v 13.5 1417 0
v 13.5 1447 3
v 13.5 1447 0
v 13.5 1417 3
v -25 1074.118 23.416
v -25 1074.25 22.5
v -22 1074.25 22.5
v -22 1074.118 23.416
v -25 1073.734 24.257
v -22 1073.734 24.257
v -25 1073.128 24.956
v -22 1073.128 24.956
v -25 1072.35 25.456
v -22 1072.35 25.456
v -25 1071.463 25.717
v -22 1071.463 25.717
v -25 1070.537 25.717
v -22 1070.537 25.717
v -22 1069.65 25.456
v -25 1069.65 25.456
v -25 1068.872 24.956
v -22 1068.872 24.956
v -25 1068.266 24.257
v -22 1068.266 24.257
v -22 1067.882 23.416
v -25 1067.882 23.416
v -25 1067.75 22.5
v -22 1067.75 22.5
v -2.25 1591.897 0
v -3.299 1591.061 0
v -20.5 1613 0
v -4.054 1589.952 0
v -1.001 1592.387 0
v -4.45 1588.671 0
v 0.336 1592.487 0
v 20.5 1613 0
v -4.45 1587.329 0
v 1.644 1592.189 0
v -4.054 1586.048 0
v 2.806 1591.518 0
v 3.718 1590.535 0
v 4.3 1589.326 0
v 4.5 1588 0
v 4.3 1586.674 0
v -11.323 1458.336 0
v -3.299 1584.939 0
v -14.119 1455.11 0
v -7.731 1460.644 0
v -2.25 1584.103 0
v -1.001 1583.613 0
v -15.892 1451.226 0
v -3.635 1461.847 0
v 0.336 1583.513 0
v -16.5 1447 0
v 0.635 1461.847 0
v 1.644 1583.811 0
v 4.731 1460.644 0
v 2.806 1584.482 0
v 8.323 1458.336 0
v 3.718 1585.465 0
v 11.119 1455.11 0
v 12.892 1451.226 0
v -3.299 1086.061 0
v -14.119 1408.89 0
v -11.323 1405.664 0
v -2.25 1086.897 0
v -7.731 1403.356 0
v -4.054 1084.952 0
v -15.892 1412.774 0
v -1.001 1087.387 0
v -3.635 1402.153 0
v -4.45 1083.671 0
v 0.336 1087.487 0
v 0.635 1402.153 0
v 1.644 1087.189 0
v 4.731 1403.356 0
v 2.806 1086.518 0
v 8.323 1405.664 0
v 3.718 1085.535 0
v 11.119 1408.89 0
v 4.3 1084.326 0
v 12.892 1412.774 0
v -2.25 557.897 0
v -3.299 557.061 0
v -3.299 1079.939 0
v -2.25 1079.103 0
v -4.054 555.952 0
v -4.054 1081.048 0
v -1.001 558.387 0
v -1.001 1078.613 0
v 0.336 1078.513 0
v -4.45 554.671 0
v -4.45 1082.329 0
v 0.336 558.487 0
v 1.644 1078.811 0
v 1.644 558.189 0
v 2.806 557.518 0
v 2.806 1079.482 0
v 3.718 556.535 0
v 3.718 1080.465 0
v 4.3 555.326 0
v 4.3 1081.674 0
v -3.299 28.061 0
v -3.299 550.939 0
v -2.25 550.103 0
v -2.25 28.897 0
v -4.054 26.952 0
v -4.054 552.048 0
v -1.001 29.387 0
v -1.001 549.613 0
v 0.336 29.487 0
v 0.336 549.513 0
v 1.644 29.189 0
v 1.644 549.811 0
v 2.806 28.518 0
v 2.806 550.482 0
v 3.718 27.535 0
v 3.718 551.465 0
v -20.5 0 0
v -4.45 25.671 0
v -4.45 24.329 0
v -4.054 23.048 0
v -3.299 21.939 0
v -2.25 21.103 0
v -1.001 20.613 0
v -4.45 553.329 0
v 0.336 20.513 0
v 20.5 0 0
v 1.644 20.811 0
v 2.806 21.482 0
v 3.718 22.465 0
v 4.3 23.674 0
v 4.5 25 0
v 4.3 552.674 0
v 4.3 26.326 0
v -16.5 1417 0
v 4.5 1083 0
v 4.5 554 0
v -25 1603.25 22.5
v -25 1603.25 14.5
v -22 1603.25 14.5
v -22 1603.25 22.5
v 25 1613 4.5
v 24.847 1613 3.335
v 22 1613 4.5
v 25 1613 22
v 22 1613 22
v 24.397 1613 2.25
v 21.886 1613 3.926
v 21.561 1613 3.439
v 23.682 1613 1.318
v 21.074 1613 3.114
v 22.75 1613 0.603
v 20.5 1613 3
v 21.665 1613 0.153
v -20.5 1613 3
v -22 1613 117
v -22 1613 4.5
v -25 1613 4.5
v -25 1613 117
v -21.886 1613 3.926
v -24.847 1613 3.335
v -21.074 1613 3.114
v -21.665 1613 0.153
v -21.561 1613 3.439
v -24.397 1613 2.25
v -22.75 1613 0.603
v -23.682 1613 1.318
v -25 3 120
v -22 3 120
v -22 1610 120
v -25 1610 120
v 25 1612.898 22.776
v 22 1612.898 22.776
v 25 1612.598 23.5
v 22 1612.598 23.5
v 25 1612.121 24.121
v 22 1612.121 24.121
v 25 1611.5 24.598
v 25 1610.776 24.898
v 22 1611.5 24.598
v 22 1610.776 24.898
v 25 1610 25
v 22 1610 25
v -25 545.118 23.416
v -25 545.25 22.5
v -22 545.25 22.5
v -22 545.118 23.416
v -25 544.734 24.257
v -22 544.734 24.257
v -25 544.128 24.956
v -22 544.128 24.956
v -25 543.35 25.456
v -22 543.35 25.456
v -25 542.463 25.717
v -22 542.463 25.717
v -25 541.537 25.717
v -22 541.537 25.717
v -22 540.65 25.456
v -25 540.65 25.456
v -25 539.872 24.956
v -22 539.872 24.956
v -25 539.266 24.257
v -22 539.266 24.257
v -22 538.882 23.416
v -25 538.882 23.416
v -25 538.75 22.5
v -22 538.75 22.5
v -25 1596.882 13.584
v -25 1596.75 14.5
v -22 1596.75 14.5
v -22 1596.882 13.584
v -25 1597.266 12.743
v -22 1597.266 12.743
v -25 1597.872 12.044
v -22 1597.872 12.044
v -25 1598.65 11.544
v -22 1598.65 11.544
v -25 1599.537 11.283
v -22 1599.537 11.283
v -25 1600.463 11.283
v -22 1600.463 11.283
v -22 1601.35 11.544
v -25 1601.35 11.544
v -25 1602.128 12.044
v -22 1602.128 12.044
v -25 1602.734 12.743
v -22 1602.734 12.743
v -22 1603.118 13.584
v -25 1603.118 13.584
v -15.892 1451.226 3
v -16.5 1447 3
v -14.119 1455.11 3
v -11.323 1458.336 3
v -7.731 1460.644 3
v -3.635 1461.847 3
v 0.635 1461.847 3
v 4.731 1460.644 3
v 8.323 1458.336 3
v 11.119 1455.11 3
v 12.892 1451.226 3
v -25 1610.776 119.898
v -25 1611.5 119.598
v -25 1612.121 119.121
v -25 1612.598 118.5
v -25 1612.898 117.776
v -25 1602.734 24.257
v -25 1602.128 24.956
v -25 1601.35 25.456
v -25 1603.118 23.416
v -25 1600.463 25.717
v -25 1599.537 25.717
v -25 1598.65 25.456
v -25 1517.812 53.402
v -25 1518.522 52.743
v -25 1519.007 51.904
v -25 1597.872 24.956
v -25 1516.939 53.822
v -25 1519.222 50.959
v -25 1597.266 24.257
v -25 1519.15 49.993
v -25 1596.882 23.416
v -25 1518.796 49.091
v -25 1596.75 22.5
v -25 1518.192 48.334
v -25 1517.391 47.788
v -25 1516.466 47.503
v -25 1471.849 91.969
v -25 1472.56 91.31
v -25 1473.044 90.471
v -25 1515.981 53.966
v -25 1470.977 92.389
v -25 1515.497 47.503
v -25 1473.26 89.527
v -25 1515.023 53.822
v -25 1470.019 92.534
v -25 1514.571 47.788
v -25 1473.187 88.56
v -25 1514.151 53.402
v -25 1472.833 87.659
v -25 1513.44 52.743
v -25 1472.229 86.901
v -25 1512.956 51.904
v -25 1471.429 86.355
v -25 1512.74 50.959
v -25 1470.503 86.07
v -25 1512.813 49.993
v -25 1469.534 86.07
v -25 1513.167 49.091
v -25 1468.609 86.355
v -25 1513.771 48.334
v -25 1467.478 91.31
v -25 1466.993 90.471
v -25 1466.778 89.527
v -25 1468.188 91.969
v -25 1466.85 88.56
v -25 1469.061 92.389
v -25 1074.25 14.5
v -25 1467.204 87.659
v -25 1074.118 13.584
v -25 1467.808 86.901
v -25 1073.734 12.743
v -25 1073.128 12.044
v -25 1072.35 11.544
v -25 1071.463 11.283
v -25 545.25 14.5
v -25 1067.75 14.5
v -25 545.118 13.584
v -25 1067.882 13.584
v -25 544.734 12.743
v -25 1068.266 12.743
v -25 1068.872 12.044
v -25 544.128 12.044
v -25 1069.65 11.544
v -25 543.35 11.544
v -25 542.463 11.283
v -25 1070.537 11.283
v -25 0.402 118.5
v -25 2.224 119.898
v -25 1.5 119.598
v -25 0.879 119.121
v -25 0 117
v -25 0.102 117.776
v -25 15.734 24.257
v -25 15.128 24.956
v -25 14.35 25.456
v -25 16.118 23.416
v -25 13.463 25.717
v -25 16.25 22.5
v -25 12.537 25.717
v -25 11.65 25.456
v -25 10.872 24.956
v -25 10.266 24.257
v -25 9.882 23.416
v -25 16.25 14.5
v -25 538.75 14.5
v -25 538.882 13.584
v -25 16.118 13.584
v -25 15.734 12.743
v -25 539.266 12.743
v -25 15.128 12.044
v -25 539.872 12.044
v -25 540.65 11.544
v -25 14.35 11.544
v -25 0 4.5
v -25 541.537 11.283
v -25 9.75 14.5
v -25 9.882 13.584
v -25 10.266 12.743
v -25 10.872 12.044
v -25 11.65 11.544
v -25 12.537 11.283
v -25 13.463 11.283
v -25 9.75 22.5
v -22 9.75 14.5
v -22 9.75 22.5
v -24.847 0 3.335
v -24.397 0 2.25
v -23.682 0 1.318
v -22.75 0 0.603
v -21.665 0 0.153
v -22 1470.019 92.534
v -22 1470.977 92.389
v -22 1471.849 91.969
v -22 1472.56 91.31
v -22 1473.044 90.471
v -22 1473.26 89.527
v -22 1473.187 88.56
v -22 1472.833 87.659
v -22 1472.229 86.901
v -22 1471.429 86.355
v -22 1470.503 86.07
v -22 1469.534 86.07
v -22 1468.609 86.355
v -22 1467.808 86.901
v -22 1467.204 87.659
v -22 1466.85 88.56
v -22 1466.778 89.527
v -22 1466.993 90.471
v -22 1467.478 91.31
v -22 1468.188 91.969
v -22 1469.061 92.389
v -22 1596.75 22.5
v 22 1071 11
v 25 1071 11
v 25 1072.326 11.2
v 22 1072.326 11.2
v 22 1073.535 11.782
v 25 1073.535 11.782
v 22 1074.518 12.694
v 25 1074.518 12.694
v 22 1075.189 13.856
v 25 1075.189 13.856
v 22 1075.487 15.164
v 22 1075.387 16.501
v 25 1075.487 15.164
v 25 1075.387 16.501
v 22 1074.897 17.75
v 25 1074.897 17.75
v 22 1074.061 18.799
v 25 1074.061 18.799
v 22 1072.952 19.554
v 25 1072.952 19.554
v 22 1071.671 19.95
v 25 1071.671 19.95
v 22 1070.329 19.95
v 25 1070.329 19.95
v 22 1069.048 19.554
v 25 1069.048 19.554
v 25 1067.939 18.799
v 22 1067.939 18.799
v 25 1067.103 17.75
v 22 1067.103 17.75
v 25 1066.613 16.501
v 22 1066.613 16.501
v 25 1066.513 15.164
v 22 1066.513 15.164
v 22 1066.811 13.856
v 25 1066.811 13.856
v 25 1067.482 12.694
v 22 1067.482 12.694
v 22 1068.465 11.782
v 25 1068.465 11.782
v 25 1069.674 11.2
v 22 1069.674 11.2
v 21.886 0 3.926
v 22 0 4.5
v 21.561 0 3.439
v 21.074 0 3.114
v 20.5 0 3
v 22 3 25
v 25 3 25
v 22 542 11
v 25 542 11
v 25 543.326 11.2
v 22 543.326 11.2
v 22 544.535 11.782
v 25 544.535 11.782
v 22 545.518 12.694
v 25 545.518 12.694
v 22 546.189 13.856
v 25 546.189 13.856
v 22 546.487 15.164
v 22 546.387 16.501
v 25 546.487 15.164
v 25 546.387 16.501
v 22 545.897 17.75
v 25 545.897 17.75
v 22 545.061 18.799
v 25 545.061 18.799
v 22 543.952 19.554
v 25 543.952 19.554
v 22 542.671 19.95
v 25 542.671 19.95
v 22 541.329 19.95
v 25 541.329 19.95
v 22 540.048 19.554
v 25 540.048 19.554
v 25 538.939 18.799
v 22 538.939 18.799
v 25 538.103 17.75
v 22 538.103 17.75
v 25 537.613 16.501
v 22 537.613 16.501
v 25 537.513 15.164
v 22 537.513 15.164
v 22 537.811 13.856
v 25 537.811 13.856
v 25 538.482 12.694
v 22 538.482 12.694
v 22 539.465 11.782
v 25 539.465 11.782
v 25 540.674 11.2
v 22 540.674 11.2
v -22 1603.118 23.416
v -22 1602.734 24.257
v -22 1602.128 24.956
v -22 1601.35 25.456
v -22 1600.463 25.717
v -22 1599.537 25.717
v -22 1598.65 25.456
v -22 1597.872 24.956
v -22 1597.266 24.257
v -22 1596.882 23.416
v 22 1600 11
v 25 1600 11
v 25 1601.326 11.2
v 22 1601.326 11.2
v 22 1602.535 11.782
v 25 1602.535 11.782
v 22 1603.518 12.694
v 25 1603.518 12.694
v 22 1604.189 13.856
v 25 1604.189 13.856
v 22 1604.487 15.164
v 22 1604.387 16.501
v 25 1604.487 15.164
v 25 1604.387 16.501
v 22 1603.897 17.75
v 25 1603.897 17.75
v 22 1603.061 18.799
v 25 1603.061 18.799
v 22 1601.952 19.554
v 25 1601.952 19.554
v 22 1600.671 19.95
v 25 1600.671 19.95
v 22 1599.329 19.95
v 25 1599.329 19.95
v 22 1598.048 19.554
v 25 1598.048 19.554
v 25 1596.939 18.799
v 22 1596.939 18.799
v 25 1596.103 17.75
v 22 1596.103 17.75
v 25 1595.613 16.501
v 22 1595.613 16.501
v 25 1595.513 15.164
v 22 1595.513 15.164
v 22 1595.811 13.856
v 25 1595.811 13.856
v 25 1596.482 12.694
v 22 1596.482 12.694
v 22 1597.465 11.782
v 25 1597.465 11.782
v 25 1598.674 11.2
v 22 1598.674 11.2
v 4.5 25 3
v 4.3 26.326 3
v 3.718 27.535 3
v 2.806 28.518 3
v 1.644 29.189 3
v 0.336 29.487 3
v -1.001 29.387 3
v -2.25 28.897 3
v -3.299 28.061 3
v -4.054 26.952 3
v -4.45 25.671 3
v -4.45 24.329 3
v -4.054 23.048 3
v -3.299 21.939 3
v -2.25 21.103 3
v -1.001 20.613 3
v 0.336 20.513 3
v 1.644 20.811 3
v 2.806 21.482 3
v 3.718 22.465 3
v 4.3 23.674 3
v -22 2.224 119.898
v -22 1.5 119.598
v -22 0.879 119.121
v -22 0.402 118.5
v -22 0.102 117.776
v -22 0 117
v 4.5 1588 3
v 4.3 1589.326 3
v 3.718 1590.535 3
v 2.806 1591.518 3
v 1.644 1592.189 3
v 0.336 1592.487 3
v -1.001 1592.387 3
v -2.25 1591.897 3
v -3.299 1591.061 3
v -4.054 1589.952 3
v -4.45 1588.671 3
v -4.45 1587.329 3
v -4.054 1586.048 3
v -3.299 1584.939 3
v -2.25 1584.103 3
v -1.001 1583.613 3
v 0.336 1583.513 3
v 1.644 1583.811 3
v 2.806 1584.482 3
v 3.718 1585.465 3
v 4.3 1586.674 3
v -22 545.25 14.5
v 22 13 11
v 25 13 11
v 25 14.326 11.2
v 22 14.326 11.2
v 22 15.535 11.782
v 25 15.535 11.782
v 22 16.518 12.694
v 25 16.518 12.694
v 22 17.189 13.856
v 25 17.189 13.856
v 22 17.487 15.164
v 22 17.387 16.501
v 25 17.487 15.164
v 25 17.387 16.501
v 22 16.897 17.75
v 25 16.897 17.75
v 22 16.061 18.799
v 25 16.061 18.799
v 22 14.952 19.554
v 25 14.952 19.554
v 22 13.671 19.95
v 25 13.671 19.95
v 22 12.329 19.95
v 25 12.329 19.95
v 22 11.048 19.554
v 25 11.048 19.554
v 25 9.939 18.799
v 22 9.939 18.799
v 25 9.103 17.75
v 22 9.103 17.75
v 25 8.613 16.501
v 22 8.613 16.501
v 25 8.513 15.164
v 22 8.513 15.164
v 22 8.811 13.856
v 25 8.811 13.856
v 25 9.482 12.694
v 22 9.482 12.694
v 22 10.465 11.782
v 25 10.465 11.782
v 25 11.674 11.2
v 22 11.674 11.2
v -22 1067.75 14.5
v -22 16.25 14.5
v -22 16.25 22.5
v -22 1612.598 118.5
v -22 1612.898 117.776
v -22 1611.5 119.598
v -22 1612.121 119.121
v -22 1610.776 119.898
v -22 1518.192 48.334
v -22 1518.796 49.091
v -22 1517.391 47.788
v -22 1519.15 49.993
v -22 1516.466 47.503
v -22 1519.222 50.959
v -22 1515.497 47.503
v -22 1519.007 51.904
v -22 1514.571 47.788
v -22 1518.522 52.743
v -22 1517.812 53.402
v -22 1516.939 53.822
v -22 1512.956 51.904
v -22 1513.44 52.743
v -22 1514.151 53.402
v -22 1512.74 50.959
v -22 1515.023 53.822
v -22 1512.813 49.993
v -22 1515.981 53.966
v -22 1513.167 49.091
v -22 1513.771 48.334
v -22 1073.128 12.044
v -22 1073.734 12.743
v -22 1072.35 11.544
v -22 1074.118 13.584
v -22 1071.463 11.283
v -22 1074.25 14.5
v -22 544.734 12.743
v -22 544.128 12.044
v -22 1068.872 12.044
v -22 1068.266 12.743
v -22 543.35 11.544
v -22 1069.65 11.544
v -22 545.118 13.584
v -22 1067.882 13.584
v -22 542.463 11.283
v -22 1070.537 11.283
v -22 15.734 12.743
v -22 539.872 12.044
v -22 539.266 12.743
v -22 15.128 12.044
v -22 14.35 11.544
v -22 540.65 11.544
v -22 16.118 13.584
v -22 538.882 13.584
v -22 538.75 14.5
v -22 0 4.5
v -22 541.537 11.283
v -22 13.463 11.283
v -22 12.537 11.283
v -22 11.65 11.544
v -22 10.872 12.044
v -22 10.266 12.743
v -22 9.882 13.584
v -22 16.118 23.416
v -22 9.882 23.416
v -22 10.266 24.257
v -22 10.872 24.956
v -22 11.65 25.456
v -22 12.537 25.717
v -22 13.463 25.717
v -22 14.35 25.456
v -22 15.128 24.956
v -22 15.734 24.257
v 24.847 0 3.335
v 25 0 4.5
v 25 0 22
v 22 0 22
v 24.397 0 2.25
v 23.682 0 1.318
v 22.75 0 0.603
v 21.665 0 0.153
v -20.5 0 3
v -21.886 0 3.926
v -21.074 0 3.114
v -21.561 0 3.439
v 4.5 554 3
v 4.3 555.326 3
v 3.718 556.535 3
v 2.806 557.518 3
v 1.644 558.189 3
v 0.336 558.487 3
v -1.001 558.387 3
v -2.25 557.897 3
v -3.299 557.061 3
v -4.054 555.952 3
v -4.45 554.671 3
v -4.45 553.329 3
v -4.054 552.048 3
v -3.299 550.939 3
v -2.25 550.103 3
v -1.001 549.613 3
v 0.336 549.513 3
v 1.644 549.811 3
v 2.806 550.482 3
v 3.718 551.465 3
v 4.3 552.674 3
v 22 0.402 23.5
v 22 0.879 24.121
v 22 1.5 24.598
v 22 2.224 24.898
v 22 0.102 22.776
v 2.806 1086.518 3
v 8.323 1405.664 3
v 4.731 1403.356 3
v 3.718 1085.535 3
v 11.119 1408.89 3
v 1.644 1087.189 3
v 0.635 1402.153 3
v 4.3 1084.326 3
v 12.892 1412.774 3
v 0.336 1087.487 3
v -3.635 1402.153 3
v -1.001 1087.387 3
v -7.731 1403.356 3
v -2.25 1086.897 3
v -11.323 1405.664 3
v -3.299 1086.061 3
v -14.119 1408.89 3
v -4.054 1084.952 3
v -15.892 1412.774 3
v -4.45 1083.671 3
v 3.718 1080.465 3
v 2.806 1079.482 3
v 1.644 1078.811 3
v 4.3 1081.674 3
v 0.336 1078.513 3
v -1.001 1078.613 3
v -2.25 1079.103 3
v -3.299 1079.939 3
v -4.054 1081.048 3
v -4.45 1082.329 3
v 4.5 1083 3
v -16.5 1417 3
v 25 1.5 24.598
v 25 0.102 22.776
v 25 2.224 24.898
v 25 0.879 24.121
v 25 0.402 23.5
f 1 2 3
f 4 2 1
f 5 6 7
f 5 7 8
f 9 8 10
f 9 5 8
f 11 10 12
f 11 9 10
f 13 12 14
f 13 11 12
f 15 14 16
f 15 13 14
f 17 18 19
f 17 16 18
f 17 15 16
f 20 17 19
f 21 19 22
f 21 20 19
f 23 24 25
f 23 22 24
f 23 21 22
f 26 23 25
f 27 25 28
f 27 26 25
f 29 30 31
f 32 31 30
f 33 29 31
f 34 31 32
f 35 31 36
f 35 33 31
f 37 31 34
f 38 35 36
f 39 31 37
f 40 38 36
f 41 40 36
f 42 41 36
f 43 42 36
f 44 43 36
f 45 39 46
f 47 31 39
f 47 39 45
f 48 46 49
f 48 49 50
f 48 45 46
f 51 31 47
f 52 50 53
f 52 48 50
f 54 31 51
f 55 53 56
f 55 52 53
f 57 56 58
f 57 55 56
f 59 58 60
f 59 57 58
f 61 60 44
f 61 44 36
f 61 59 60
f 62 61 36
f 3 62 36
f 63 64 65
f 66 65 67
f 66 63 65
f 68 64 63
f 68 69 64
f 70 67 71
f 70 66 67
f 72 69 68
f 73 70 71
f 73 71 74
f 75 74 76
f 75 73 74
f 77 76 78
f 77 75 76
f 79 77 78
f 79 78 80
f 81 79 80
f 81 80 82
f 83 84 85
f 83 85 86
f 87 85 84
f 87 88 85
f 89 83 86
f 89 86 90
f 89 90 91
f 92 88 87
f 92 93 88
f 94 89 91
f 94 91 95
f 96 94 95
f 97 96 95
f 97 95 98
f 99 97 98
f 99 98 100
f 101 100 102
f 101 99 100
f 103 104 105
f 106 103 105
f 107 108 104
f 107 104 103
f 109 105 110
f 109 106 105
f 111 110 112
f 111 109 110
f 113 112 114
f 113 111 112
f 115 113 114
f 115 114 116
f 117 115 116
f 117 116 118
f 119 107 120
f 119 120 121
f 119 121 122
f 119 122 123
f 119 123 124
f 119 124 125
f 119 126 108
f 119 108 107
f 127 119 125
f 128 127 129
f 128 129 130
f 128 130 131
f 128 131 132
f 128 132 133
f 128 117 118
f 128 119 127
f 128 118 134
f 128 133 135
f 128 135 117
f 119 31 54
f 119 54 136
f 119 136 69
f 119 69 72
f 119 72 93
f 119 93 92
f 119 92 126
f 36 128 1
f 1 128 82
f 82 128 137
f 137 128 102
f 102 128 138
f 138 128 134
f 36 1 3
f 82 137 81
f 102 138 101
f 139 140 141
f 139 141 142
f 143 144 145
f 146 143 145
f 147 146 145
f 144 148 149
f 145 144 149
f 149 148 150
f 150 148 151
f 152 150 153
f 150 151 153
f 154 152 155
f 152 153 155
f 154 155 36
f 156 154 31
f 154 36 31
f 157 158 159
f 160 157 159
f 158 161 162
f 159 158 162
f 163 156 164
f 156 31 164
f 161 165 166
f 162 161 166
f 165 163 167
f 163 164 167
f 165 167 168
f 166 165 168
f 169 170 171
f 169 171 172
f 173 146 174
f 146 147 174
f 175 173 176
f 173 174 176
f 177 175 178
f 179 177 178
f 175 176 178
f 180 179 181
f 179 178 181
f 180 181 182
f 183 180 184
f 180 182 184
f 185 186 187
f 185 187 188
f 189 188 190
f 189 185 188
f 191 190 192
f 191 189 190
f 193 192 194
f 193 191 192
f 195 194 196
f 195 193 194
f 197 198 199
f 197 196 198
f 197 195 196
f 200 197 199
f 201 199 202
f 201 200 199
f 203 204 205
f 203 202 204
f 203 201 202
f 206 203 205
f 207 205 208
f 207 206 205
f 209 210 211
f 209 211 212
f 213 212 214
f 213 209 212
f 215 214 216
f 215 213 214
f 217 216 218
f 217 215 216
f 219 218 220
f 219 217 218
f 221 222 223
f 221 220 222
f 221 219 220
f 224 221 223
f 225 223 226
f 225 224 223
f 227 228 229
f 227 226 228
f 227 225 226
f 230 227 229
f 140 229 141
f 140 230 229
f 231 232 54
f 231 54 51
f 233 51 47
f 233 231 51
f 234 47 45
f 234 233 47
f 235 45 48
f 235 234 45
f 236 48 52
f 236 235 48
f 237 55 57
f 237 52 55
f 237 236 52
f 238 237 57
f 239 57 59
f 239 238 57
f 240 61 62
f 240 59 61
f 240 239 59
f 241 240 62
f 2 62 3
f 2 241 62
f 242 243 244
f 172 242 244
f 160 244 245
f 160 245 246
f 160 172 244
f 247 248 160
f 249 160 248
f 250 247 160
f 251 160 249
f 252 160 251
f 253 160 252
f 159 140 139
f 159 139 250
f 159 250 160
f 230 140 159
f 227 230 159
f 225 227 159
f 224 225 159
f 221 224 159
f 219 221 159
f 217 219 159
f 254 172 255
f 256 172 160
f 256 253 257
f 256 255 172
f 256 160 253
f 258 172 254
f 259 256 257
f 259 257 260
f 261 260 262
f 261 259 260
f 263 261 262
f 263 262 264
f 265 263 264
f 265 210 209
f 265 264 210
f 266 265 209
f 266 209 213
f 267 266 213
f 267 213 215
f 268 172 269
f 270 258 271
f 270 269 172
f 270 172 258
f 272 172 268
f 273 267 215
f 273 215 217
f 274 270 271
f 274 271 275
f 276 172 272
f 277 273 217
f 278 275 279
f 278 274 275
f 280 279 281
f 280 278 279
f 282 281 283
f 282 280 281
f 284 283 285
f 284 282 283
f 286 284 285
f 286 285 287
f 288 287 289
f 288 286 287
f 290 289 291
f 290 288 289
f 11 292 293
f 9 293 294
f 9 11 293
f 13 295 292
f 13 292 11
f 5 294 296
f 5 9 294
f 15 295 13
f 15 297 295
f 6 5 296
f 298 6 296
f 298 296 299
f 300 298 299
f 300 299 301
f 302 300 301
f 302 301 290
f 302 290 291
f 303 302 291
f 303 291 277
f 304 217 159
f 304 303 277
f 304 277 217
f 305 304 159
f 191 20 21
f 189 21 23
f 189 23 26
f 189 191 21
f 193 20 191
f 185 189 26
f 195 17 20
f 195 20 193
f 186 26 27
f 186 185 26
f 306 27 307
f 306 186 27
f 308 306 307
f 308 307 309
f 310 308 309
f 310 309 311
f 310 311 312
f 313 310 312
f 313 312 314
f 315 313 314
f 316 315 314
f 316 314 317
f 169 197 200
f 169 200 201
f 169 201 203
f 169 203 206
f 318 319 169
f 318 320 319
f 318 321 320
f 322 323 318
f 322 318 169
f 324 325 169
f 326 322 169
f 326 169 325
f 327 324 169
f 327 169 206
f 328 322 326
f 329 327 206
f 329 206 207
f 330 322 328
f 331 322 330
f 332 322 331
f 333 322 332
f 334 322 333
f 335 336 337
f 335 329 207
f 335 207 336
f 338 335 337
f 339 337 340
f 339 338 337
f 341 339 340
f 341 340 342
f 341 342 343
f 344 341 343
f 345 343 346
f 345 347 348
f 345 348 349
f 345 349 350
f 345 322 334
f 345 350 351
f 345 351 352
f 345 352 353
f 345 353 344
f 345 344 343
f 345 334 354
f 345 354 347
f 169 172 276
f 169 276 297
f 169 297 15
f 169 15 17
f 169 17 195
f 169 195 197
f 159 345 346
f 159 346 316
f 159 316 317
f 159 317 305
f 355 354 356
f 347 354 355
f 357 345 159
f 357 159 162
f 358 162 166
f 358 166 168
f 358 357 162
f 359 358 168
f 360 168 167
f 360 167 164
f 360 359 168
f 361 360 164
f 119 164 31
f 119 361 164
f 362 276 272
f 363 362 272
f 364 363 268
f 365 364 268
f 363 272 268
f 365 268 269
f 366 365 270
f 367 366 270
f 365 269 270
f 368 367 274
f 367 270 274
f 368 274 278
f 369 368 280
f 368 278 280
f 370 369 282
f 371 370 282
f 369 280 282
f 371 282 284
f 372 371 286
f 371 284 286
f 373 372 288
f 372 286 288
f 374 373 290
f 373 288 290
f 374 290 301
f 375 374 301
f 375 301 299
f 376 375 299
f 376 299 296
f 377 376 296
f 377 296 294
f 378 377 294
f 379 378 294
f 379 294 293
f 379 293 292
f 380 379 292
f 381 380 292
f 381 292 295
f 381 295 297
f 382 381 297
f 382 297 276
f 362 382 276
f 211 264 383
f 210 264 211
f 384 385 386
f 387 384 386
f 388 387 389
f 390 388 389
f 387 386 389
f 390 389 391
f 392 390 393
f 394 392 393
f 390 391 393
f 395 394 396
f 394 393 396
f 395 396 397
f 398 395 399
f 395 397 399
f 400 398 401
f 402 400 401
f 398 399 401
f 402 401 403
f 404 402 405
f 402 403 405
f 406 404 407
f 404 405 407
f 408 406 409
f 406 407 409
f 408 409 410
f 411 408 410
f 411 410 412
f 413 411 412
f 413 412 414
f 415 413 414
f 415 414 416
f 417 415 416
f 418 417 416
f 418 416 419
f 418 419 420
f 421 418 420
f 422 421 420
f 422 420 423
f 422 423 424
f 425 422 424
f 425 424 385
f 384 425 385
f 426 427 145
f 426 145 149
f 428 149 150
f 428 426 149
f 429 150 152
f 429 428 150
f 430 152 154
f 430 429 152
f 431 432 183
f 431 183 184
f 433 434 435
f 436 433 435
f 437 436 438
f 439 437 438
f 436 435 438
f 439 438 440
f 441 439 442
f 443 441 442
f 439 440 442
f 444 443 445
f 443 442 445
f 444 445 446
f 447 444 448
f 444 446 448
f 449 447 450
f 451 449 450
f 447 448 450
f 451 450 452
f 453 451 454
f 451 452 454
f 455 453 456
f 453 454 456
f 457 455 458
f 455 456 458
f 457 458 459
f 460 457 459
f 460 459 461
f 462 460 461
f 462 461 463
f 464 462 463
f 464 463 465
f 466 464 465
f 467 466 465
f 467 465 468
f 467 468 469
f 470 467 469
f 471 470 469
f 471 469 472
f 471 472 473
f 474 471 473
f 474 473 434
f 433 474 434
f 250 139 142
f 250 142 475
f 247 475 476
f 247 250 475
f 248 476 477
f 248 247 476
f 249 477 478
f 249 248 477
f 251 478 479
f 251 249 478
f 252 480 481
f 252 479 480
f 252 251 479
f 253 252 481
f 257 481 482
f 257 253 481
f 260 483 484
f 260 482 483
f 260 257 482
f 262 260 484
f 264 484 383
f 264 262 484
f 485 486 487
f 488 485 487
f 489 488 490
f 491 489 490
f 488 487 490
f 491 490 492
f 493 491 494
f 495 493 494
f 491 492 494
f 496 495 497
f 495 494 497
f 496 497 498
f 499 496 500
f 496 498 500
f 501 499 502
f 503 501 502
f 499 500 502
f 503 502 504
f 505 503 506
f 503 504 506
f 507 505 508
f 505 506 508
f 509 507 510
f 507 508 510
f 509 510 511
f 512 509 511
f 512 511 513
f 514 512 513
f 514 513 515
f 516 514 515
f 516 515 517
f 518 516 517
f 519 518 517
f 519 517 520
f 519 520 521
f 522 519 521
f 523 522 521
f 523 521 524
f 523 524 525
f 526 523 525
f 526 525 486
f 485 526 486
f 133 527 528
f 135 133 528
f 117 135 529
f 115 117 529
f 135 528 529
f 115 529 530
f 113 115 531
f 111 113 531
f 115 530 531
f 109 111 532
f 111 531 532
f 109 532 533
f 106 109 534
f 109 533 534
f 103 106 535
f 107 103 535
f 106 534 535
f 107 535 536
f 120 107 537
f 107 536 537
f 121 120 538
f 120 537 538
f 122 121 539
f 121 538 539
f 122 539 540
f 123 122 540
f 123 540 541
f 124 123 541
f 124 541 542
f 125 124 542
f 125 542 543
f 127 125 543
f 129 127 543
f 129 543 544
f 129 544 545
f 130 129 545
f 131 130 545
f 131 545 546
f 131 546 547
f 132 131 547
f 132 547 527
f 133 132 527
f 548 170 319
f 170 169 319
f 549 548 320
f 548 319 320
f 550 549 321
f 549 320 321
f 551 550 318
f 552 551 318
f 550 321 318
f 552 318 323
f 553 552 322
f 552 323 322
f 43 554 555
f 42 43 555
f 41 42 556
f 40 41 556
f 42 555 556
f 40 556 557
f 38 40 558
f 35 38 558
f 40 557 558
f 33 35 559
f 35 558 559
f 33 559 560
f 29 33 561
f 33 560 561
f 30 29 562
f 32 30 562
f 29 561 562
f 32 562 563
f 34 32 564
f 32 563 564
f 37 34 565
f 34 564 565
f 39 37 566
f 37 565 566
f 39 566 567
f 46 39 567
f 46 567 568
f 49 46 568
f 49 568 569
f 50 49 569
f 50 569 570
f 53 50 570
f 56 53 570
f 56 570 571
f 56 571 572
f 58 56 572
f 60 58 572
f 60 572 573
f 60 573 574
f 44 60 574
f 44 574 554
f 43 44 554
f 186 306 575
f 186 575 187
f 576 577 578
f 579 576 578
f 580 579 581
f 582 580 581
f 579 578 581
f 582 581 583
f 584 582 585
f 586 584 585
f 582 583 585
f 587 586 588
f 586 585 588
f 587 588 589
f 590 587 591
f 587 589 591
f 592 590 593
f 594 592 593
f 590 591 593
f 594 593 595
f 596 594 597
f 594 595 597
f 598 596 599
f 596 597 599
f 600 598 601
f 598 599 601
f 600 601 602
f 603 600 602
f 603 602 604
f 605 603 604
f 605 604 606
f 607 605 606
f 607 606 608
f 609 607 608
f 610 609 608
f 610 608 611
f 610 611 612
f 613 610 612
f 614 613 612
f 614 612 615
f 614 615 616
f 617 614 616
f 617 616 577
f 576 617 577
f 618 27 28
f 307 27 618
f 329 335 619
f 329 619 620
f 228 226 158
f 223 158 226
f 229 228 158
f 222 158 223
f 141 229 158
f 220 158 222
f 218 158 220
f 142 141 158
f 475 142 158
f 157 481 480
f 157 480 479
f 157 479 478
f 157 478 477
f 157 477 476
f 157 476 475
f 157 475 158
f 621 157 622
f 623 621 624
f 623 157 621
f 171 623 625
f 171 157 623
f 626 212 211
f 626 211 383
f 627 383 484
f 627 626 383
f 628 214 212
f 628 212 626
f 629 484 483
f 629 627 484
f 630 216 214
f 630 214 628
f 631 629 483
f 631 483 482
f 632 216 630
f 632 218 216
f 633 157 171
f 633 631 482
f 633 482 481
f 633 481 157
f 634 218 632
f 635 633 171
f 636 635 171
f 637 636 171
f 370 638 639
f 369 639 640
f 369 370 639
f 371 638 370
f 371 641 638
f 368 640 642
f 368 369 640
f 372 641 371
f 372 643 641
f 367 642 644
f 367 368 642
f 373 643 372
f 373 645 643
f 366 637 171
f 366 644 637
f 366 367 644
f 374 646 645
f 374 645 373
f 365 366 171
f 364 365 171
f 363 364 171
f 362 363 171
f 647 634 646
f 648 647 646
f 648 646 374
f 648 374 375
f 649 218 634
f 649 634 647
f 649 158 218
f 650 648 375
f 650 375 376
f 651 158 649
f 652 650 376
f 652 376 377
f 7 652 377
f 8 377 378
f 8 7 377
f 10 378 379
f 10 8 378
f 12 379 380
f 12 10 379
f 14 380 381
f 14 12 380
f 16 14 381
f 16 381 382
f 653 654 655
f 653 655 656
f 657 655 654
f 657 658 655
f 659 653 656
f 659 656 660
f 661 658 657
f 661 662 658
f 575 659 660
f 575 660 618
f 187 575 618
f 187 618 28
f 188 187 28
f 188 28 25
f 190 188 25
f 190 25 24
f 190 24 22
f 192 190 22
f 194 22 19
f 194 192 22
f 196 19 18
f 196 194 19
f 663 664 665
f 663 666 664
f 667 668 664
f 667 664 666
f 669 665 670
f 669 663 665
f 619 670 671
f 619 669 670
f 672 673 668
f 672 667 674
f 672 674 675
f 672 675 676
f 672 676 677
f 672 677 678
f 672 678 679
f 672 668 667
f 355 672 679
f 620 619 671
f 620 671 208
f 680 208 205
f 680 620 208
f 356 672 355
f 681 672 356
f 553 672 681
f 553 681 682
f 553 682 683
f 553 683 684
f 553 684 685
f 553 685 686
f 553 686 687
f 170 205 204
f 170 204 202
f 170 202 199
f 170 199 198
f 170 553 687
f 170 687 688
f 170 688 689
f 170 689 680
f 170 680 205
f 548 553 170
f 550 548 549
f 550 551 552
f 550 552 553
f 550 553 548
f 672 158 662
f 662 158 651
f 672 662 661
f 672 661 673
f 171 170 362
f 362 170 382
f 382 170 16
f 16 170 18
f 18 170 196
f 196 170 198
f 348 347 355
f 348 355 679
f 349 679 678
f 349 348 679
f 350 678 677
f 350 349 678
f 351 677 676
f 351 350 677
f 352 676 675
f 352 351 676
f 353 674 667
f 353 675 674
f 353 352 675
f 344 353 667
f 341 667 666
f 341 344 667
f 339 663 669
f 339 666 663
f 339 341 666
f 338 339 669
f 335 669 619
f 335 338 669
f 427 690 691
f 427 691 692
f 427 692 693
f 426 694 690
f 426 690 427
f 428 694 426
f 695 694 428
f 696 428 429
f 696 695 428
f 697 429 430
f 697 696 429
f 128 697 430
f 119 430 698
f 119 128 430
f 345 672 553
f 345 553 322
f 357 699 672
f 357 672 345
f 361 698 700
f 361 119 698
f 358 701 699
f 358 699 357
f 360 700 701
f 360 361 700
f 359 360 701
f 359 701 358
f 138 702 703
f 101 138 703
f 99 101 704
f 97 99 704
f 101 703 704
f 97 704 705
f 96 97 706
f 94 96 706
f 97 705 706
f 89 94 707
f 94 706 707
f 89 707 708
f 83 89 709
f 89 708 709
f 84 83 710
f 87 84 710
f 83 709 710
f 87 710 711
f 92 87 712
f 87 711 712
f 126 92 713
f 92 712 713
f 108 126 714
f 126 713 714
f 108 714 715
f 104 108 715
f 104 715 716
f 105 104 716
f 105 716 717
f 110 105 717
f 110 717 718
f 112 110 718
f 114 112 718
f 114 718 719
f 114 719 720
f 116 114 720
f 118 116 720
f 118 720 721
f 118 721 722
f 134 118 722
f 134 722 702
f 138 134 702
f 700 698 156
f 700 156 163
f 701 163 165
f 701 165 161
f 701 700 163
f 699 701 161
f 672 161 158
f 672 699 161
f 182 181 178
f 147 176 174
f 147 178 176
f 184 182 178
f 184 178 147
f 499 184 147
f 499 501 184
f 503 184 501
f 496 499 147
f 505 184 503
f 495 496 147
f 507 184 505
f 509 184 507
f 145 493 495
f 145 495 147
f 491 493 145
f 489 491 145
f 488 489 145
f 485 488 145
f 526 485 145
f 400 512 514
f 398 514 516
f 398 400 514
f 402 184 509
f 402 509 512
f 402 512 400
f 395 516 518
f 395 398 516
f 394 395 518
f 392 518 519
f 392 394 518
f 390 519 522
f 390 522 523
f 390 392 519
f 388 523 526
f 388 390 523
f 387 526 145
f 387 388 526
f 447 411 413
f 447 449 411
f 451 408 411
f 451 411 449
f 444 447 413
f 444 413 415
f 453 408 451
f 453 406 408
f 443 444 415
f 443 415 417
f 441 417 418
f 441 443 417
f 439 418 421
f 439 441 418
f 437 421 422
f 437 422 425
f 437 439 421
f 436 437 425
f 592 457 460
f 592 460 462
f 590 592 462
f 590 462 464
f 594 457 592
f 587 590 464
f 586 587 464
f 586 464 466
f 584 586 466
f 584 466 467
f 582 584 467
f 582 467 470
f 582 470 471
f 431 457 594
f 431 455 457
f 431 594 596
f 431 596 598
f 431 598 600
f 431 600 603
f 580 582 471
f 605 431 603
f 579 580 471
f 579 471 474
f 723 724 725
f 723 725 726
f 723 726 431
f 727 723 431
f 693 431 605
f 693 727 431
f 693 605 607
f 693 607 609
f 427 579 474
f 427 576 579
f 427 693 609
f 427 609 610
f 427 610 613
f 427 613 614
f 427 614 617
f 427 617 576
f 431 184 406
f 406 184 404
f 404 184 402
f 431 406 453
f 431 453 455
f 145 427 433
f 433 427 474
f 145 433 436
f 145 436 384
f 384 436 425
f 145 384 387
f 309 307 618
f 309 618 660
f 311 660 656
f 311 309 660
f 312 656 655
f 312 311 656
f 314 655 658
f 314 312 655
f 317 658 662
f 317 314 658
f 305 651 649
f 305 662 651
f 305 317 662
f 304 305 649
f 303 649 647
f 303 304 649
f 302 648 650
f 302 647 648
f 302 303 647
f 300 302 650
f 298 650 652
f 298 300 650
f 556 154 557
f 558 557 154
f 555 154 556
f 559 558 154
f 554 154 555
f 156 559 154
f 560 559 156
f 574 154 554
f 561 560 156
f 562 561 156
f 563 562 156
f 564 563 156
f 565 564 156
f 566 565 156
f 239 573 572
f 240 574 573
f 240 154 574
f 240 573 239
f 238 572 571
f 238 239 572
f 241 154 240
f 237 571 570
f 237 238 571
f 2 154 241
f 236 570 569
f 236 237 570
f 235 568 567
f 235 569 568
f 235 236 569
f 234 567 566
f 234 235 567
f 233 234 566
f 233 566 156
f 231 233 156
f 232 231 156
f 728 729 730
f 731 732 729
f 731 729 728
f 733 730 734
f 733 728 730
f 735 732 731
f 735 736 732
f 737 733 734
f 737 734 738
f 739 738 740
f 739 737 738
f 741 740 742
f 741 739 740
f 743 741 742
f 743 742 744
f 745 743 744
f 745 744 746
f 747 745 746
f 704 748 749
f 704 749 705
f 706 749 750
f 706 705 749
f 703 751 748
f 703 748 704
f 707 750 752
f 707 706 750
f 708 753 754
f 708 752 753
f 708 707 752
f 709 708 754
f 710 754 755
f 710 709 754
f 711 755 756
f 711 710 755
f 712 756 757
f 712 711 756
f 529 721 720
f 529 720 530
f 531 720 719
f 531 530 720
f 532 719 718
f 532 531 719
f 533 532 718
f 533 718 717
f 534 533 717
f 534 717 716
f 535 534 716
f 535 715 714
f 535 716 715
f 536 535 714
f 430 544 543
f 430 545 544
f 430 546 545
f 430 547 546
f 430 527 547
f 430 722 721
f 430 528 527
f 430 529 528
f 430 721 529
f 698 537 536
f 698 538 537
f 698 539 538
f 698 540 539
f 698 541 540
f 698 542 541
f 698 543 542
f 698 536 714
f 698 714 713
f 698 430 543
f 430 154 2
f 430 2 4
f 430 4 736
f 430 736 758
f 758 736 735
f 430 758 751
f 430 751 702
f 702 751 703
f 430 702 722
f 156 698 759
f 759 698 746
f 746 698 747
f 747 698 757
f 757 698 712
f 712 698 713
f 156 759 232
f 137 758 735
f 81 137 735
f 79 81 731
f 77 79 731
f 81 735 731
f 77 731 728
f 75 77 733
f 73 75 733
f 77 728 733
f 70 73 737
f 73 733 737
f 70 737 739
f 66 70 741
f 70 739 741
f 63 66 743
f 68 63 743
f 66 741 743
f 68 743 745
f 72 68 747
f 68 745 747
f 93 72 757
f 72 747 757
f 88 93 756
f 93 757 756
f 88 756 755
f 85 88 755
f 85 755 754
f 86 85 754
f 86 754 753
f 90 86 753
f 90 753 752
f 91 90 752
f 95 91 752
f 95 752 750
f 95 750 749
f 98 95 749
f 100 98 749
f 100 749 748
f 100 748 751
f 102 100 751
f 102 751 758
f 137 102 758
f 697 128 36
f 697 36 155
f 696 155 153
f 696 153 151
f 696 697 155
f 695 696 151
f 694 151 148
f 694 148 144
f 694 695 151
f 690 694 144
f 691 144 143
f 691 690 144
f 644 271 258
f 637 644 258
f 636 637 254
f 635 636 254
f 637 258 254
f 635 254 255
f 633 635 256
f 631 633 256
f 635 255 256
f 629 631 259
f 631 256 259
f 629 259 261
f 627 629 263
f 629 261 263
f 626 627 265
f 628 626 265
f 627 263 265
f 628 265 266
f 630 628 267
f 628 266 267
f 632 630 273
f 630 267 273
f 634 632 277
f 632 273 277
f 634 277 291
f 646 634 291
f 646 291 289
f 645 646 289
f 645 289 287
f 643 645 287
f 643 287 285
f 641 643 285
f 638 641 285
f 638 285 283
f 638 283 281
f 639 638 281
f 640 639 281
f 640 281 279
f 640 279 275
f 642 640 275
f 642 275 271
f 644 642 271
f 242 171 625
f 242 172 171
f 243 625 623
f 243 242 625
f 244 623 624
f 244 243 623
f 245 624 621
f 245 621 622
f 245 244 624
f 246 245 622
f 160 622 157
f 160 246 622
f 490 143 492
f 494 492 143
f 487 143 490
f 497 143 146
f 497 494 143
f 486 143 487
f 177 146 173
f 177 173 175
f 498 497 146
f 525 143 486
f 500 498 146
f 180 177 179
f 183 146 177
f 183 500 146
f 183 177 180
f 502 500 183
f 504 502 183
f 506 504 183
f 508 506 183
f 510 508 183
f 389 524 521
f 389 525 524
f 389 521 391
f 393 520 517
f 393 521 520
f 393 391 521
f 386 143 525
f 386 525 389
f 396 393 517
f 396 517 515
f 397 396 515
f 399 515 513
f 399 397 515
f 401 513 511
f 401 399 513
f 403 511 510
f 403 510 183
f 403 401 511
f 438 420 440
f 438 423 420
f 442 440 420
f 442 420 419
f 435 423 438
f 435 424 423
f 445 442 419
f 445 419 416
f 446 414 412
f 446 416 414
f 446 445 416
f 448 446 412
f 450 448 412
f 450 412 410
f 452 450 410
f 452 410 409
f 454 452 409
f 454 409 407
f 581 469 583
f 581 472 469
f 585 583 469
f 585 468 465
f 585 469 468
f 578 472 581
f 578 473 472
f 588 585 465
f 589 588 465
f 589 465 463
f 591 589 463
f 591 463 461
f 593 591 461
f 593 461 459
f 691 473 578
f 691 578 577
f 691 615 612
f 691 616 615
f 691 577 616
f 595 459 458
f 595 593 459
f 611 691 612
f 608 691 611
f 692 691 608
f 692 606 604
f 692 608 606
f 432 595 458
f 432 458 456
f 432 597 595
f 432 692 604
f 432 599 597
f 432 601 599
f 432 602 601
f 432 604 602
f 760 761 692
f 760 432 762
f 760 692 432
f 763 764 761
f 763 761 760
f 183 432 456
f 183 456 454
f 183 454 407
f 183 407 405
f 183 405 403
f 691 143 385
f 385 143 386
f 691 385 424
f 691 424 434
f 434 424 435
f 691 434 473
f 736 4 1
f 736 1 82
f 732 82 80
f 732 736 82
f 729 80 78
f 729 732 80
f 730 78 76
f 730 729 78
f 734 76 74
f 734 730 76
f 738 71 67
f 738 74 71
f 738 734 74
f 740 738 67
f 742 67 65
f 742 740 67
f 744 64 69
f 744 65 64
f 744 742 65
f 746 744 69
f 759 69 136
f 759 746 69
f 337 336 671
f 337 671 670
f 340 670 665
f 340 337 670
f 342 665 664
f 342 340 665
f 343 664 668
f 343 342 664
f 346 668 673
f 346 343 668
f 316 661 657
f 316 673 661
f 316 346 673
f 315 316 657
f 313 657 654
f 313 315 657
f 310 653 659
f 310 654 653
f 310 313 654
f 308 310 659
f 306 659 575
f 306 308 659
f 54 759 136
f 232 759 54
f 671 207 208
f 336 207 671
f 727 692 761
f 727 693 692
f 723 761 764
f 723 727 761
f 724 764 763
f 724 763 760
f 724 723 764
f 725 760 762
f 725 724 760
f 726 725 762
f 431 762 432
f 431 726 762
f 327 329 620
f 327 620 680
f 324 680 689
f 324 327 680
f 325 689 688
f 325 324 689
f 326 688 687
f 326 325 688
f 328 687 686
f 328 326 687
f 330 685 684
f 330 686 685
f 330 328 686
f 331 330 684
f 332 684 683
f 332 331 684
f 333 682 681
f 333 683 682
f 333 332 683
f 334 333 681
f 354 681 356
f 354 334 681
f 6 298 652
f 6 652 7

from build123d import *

# Parameters (mm, degrees)
BASE_FLANGE1_DEPTH = 1613
CUT_EXTRUDE1_REACH = 1620.23
FILLET1_R          = 3
CUT_EXTRUDE2_REACH = 1620.23
SKETCH7_R          = 4.5
LPATTERN1_COUNT    = 4
LPATTERN1_PITCH    = 529
CUT_EXTRUDE3_REACH = 1620.23
SKETCH8_R          = 3.25
CUT_EXTRUDE4_REACH = 1619.431
CUT_EXTRUDE5_REACH = 1619.431
SKETCH10_R         = 4.5
LPATTERN2_COUNT    = 3
LPATTERN2_PITCH    = 529
CUT_EXTRUDE6_REACH = 1619.431
SKETCH11_R         = 4.5


# Sheet-metal steps are written as plain solids
with BuildPart() as part:
    # Sketch1 → Base-Flange1 (new body)
    with BuildSketch(Plane(origin=(0, 0, 0), x_dir=(1, 0, 0), z_dir=(0, 1, 0))):
        with BuildLine():
            Line((-25, -120), (-25, -4.5))
            ThreePointArc((-25, -4.5), (-23.681980515, -1.318019485), (-20.5, 0))
            Line((-20.5, 0), (20.5, 0))
            ThreePointArc((20.5, 0), (23.681980515, -1.318019485), (25, -4.5))
            Line((25, -4.5), (25, -25))
            Line((25, -25), (22, -25))
            Line((22, -25), (22, -4.5))
            ThreePointArc((22, -4.5), (21.560660172, -3.439339828), (20.5, -3))
            Line((20.5, -3), (-20.5, -3))
            ThreePointArc((-20.5, -3), (-21.560660172, -3.439339828), (-22, -4.5))
            Line((-22, -4.5), (-22, -120))
            Line((-22, -120), (-25, -120))
        make_face()
    extrude(amount=BASE_FLANGE1_DEPTH)

    # Sketch6 → Cut-Extrude1 (cut, up to next)
    with BuildSketch(Plane.ZY.offset(25), mode=Mode.PRIVATE) as cut_extrude1_sk1:
        with BuildLine():
            Line((14.5, 16.25), (22.5, 16.25))
            ThreePointArc((22.5, 16.25), (25.75, 13), (22.5, 9.75))
            Line((22.5, 9.75), (14.5, 9.75))
            ThreePointArc((14.5, 9.75), (11.25, 13), (14.5, 16.25))
        make_face()
    cut_extrude1_tool1 = extrude(cut_extrude1_sk1.sketch, amount=-CUT_EXTRUDE1_REACH, mode=Mode.PRIVATE) & part.part
    cut_extrude1 = cut_extrude1_tool1.solids().sort_by_distance((-25, 13, 18.5))[0]
    add(cut_extrude1, mode=Mode.SUBTRACT)

    # Fillet1
    fillet1_edges = [part.edges().sort_by_distance(p)[0] for p in [
        (23.5, 0, 25),
        (-23.5, 0, 120),
        (23.5, 1613, 25),
        (-23.5, 1613, 120),
    ]]
    fillet(fillet1_edges, radius=FILLET1_R)

    # Sketch7 → Cut-Extrude2 (cut, up to next)
    with BuildSketch(Plane(origin=(25, 0, 0), x_dir=(0, 0, -1), z_dir=(1, 0, 0)), mode=Mode.PRIVATE) as cut_extrude2_sk1:
        with Locations((-15.5, 13)):
            Circle(SKETCH7_R)
    cut_extrude2_tool1 = extrude(cut_extrude2_sk1.sketch, amount=-CUT_EXTRUDE2_REACH, mode=Mode.PRIVATE) & part.part
    cut_extrude2 = cut_extrude2_tool1.solids().sort_by_distance((25, 13, 15.5))[0]
    add(cut_extrude2, mode=Mode.SUBTRACT)

    # LPattern1: Cut-Extrude1, Cut-Extrude2 ×4
    with Locations(*[(0, i * LPATTERN1_PITCH, 0) for i in range(1, LPATTERN1_COUNT)]):
        add(cut_extrude1, mode=Mode.SUBTRACT)
        add(cut_extrude2, mode=Mode.SUBTRACT)

    # Sketch8 → Cut-Extrude3 (cut, up to next)
    with BuildSketch(Plane.ZY.offset(25), mode=Mode.PRIVATE) as cut_extrude3_sk1:
        with Locations((50.716371709, 1515.981333294)):
            Circle(SKETCH8_R)
    cut_extrude3_tool1 = extrude(cut_extrude3_sk1.sketch, amount=-CUT_EXTRUDE3_REACH, mode=Mode.PRIVATE) & part.part
    # Sketch8 → Cut-Extrude3 (cut, up to next)
    with BuildSketch(Plane.ZY.offset(25), mode=Mode.PRIVATE) as cut_extrude3_sk2:
        with Locations((89.283628291, 1470.018666706)):
            Circle(SKETCH8_R)
    cut_extrude3_tool2 = extrude(cut_extrude3_sk2.sketch, amount=-CUT_EXTRUDE3_REACH, mode=Mode.PRIVATE) & part.part
    add(cut_extrude3_tool1.solids().sort_by_distance((-25, 1515.981333, 50.716372))[0], mode=Mode.SUBTRACT)
    add(cut_extrude3_tool2.solids().sort_by_distance((-25, 1470.018667, 89.283628))[0], mode=Mode.SUBTRACT)

    # Sketch9 → Cut-Extrude4 (cut, up to next)
    with BuildSketch(Plane.XY.offset(3), mode=Mode.PRIVATE) as cut_extrude4_sk1:
        with BuildLine():
            Line((-16.5, 1417), (-16.5, 1447))
            ThreePointArc((-16.5, 1447), (-1.5, 1462), (13.5, 1447))
            Line((13.5, 1447), (13.5, 1417))
            ThreePointArc((13.5, 1417), (-1.5, 1402), (-16.5, 1417))
        make_face()
    cut_extrude4_tool1 = extrude(cut_extrude4_sk1.sketch, amount=-CUT_EXTRUDE4_REACH, mode=Mode.PRIVATE) & part.part
    add(cut_extrude4_tool1.solids().sort_by_distance((-1.5, 1432, 3))[0], mode=Mode.SUBTRACT)

    # Sketch10 → Cut-Extrude5 (cut, up to next)
    with BuildSketch(Plane.XY.offset(3), mode=Mode.PRIVATE) as cut_extrude5_sk1:
        with Locations((0, 25)):
            Circle(SKETCH10_R)
    cut_extrude5_tool1 = extrude(cut_extrude5_sk1.sketch, amount=-CUT_EXTRUDE5_REACH, mode=Mode.PRIVATE) & part.part
    cut_extrude5 = cut_extrude5_tool1.solids().sort_by_distance((0, 25, 3))[0]
    add(cut_extrude5, mode=Mode.SUBTRACT)

    # LPattern2: Cut-Extrude5 ×3
    with Locations(*[(0, i * LPATTERN2_PITCH, 0) for i in range(1, LPATTERN2_COUNT)]):
        add(cut_extrude5, mode=Mode.SUBTRACT)

    # Sketch11 → Cut-Extrude6 (cut, up to next)
    with BuildSketch(Plane.XY.offset(3), mode=Mode.PRIVATE) as cut_extrude6_sk1:
        with Locations((0, 1588)):
            Circle(SKETCH11_R)
    cut_extrude6_tool1 = extrude(cut_extrude6_sk1.sketch, amount=-CUT_EXTRUDE6_REACH, mode=Mode.PRIVATE) & part.part
    add(cut_extrude6_tool1.solids().sort_by_distance((0, 1588, 3))[0], mode=Mode.SUBTRACT)


solid = part.part
